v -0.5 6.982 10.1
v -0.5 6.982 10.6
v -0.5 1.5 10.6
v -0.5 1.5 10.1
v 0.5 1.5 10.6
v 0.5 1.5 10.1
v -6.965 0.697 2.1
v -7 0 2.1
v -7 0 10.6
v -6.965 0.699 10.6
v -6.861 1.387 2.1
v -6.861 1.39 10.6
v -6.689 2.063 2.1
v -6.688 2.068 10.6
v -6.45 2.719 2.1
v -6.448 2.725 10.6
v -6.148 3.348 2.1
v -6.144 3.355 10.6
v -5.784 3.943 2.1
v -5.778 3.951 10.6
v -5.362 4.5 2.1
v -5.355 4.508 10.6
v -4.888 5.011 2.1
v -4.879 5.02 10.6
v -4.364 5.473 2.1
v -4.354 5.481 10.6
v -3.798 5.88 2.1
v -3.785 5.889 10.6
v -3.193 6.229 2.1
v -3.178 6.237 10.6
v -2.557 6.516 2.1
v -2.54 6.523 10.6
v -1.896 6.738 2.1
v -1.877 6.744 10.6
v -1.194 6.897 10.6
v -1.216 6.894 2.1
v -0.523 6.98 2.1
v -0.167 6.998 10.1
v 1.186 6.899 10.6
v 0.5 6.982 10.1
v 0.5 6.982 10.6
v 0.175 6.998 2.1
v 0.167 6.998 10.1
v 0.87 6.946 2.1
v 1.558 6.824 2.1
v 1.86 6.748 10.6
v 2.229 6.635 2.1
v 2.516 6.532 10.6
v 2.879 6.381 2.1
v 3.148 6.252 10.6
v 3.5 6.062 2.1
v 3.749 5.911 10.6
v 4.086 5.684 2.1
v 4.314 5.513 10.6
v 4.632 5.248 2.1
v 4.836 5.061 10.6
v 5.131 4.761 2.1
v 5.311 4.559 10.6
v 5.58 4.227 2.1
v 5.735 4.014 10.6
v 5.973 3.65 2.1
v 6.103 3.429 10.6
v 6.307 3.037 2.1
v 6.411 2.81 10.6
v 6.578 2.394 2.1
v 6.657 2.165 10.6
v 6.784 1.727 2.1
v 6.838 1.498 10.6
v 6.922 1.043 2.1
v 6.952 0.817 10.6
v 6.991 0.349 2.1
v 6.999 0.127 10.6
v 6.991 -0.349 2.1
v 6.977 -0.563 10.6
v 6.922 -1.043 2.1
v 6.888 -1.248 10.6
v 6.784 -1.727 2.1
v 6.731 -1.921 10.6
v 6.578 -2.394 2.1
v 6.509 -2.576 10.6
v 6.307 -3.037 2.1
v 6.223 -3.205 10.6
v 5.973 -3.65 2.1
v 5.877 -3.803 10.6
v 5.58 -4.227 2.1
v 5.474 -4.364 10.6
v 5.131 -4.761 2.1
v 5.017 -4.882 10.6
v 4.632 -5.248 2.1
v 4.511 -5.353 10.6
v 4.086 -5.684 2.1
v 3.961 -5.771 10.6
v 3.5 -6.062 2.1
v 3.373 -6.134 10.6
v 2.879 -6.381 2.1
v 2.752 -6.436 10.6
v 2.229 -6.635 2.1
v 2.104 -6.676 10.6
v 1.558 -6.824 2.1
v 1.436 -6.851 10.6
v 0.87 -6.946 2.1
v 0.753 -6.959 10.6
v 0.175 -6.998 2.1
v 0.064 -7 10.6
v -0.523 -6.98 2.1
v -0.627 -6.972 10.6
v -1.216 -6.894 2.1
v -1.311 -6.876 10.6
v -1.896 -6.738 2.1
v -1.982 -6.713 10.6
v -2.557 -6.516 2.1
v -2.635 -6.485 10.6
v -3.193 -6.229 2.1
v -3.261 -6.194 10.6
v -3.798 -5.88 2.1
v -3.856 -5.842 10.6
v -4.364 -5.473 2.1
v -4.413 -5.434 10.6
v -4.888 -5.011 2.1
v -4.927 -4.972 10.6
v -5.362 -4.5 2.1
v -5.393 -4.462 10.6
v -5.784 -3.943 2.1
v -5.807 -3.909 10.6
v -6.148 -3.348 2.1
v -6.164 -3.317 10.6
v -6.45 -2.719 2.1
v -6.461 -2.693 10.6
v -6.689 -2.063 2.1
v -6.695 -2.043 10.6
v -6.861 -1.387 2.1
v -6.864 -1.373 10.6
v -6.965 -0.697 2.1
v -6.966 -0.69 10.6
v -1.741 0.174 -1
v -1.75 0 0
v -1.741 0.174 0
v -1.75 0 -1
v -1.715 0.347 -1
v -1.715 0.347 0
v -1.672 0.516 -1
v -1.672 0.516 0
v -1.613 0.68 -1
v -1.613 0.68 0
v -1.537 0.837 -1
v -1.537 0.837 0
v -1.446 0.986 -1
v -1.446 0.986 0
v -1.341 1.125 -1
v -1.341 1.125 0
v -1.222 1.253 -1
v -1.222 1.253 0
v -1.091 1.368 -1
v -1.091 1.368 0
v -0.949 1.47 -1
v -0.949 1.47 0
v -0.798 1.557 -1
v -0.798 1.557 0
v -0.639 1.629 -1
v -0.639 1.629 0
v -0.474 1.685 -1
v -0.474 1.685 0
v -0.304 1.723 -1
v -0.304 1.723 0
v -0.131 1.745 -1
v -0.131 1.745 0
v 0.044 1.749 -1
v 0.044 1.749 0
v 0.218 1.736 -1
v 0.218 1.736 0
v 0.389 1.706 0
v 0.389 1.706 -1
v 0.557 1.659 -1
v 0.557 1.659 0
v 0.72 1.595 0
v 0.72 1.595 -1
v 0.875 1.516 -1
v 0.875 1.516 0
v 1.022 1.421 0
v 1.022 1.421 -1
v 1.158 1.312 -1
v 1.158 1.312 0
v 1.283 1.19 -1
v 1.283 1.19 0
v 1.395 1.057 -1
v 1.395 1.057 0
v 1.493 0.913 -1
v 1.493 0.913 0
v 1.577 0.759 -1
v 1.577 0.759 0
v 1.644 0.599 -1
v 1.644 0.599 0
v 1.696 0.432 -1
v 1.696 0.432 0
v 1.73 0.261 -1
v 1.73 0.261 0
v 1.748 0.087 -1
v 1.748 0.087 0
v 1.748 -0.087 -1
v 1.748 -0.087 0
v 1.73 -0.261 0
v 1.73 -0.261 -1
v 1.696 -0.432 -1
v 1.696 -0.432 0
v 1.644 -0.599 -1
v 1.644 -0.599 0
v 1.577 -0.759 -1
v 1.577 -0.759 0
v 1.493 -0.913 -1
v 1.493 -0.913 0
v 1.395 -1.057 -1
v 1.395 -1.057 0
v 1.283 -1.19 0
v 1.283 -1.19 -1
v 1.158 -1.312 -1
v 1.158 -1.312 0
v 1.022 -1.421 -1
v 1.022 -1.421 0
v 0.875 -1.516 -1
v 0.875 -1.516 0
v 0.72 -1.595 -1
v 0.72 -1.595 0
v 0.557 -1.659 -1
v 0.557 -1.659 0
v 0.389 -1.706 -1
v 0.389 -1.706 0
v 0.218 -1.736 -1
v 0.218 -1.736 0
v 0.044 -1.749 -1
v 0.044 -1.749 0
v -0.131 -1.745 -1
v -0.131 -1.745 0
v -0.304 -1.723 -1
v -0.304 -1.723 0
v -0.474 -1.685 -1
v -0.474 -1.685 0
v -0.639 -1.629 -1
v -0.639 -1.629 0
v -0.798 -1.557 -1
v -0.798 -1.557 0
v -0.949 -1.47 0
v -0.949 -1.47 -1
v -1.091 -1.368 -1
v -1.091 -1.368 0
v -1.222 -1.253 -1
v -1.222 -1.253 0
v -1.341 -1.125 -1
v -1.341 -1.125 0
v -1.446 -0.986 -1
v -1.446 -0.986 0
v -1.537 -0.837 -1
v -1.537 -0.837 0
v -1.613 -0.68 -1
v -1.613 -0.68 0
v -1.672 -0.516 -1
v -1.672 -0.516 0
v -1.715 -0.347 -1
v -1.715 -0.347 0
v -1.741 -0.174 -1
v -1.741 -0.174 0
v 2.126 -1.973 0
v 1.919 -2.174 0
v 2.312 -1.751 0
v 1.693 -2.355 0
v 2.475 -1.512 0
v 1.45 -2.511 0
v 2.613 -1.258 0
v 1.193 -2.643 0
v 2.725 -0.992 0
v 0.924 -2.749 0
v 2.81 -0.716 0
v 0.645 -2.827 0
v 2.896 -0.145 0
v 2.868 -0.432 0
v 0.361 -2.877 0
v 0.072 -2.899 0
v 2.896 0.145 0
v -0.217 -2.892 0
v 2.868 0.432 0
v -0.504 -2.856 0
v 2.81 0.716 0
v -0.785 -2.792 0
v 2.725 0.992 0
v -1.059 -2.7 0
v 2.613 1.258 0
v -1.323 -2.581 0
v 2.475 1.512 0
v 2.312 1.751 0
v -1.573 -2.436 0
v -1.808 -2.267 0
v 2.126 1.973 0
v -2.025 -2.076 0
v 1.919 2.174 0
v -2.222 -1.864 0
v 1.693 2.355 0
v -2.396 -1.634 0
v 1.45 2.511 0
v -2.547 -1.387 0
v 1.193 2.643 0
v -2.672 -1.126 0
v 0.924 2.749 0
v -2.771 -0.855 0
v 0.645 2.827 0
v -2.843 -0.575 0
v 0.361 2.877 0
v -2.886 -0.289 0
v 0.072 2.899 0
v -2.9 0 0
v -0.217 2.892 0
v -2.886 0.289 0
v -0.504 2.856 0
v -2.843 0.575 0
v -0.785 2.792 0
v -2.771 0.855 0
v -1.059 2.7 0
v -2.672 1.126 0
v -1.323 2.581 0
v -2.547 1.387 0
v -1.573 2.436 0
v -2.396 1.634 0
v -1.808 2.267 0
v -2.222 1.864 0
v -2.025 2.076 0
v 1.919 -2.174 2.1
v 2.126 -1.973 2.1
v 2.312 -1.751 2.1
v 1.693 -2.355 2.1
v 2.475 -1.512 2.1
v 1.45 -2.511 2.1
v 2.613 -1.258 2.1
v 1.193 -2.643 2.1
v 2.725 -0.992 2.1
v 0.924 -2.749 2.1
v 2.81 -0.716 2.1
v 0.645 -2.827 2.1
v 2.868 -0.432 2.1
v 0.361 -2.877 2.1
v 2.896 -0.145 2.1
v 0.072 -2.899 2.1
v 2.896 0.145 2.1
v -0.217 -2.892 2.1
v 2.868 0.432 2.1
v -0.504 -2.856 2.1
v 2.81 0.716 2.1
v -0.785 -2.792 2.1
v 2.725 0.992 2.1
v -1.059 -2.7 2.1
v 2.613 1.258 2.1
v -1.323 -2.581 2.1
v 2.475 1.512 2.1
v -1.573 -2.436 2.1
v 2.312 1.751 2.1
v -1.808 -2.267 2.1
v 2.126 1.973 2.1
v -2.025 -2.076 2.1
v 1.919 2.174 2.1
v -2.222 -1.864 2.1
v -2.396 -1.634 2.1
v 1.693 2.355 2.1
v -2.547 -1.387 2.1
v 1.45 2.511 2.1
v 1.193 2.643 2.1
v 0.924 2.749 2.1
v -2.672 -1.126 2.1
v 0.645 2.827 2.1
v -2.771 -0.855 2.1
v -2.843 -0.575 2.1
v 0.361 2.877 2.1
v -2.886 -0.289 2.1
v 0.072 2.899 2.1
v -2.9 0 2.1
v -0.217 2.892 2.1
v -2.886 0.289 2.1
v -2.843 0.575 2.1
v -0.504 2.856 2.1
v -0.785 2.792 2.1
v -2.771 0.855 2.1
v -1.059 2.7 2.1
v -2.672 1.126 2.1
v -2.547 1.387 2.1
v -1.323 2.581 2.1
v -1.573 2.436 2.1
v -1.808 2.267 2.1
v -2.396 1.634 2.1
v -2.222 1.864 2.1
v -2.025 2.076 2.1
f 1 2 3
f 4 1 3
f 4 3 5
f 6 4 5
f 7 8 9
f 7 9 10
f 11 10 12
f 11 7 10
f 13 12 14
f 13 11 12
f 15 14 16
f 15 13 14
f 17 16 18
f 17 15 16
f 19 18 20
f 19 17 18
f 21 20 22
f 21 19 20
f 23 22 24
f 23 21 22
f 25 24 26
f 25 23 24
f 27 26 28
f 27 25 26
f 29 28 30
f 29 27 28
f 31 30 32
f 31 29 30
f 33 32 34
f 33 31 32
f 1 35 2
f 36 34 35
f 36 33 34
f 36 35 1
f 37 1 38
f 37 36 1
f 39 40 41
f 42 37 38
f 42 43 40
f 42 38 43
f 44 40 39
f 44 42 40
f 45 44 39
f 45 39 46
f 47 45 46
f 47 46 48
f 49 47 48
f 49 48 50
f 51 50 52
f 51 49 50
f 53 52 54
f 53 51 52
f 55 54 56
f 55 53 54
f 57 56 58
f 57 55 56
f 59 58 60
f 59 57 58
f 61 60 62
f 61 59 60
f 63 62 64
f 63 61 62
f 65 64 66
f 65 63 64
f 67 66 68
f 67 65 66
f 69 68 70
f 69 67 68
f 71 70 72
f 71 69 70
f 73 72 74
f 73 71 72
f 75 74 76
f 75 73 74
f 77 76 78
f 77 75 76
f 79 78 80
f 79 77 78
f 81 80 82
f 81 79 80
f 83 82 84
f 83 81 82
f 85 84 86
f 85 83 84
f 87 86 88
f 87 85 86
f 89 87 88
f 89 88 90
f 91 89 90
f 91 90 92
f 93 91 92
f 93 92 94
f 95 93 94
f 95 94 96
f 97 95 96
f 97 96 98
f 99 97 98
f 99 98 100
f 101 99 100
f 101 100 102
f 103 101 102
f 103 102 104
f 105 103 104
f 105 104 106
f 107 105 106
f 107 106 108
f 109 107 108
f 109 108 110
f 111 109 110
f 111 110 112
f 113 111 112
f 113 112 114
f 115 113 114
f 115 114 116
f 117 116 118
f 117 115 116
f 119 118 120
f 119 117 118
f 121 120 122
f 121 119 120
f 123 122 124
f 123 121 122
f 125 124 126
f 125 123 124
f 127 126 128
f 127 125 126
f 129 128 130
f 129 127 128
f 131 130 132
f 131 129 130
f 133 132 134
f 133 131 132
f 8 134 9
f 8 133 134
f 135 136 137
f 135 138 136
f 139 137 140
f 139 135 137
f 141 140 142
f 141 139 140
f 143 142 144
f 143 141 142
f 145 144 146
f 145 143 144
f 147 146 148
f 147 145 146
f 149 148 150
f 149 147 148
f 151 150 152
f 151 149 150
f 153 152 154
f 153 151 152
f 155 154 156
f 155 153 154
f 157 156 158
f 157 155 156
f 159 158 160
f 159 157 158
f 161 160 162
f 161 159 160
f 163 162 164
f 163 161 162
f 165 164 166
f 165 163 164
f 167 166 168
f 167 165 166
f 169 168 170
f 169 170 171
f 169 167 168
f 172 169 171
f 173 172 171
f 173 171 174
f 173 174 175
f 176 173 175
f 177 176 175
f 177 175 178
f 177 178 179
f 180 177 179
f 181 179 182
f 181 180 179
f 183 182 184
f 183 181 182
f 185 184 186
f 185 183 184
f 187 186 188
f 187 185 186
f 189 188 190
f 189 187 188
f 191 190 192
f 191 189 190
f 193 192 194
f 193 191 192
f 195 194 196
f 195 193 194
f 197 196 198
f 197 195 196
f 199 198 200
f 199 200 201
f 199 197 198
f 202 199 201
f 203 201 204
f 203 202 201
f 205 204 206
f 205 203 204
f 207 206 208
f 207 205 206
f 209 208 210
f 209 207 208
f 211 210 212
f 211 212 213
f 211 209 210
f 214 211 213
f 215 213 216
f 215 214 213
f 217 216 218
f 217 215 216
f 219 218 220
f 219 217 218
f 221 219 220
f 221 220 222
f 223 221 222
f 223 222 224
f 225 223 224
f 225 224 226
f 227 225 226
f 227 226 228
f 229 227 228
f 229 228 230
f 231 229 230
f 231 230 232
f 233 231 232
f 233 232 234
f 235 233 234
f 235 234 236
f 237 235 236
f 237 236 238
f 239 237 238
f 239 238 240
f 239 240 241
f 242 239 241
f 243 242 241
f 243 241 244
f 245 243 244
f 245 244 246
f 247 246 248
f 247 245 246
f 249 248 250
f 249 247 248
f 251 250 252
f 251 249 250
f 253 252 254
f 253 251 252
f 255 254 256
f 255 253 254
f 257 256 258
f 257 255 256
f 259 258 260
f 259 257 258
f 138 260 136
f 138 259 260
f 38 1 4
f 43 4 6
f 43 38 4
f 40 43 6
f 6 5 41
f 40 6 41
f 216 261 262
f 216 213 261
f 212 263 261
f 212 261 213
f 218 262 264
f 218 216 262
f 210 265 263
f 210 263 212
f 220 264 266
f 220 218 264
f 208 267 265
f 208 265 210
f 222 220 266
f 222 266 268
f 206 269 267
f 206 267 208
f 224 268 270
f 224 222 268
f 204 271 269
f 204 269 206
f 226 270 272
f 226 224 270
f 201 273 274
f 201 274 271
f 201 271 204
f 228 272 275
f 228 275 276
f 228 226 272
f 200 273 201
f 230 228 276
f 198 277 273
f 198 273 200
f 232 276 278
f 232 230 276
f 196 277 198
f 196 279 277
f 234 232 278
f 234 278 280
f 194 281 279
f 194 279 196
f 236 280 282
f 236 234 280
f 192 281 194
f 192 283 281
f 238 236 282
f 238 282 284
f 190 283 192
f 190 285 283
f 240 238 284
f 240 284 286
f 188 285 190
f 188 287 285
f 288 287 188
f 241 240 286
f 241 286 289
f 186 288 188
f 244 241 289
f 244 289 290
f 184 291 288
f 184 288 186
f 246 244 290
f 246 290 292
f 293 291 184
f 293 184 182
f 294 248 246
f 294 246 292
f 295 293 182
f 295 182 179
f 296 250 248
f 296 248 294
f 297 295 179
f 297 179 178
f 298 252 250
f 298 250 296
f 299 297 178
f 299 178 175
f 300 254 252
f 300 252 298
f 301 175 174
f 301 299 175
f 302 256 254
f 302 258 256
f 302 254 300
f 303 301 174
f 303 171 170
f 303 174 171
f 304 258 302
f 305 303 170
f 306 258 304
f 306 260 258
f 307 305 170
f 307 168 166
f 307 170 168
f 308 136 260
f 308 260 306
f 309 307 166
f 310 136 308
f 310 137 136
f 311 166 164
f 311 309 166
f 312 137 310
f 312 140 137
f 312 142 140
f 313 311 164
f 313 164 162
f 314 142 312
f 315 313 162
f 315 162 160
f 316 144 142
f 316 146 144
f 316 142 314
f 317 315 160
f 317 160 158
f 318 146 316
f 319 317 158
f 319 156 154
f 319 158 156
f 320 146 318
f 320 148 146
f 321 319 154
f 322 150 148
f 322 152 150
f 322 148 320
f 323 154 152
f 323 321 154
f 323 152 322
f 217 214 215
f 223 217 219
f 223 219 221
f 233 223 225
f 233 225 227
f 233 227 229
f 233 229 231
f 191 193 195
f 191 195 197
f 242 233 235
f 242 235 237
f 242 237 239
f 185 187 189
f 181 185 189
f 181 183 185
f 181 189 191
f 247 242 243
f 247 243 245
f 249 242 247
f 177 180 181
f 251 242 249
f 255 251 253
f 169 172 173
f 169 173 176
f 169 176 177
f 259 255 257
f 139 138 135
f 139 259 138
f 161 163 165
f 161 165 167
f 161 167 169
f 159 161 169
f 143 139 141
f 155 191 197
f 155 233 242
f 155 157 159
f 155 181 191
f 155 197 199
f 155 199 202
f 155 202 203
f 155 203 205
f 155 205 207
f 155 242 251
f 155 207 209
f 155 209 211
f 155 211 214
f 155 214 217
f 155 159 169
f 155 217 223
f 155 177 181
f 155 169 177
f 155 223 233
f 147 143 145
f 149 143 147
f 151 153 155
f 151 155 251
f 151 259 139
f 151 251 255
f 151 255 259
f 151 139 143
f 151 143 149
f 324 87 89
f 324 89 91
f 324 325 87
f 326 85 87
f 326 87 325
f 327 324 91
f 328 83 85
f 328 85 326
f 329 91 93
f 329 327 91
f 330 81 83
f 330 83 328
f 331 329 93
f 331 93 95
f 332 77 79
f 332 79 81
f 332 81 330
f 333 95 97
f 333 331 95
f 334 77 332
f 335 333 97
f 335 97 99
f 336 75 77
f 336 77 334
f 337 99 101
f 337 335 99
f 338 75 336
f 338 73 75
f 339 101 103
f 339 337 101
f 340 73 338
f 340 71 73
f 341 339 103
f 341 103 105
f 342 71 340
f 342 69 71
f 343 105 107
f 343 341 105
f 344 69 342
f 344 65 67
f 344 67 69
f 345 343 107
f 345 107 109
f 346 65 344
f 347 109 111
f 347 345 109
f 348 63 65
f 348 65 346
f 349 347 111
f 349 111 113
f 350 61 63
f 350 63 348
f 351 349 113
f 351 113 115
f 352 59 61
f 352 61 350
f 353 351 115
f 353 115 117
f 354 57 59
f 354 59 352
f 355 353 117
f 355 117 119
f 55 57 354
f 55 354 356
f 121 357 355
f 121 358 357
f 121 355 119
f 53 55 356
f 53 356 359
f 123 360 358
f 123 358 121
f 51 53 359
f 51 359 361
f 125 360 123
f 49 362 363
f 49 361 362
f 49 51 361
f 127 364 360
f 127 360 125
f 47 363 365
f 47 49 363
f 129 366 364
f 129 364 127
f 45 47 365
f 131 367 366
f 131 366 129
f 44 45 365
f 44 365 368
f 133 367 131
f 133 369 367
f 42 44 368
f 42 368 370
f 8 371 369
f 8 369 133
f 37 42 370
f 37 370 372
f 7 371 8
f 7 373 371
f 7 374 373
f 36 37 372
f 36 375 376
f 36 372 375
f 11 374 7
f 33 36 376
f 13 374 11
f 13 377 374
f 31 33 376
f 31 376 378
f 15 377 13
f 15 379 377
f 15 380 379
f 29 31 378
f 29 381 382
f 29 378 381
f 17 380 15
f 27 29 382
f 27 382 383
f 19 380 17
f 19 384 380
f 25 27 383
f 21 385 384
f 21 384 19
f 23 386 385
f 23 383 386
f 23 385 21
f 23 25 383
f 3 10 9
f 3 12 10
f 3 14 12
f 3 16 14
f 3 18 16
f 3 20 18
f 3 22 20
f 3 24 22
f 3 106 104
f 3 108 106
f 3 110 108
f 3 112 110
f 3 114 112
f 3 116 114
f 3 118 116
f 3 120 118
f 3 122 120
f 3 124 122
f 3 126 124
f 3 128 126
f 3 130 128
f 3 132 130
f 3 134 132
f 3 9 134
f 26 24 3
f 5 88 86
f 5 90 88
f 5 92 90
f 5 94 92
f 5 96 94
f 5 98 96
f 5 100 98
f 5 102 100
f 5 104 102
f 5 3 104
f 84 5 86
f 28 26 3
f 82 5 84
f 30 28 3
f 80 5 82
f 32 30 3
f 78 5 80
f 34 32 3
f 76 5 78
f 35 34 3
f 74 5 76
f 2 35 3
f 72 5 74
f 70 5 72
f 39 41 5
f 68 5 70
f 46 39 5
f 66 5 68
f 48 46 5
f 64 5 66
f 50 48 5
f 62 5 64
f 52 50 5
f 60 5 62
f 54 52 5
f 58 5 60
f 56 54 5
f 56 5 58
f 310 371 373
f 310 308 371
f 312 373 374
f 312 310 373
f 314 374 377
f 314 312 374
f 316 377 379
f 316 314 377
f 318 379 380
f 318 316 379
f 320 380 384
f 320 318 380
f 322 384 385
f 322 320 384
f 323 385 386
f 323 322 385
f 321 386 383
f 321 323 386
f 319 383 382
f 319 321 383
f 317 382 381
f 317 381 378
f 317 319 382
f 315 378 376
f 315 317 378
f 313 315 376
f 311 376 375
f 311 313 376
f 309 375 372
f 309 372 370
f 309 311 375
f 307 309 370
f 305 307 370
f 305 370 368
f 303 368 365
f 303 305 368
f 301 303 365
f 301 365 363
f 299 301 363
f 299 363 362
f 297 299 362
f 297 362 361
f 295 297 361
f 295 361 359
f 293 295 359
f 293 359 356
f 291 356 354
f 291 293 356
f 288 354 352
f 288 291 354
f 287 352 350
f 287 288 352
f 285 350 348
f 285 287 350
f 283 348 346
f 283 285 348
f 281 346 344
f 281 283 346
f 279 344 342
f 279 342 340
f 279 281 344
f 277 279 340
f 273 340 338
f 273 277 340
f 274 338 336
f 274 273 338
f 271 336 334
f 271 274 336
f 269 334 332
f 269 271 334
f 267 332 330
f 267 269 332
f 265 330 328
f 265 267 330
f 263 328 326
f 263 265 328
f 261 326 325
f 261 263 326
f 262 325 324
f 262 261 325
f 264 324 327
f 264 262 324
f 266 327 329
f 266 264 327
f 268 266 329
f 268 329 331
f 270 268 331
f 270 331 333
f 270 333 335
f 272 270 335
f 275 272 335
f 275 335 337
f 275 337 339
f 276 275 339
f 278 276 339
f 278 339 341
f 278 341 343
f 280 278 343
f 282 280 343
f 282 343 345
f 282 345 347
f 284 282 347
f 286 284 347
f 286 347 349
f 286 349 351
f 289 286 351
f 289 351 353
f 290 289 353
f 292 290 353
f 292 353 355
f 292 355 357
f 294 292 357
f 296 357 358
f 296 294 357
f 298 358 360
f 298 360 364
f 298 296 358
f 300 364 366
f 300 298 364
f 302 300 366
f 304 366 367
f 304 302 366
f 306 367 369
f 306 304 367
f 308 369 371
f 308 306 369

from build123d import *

# Parameters (mm, degrees)
F3_DEPTH = 0.5


with BuildPart() as f1:
    # F0 (on Front) → F1 (revolve)
    with BuildSketch(Plane.XZ):
        Polygon((-1.75, -1), (0, -1), (0, 10.6), (-7, 10.6), (-7, 2.1), (-2.9, 2.1), (-2.9, 0), (-1.75, 0), align=None)
    revolve(axis=Axis((0, 0, 4.8), (0, 0, -1)))

    # F2 (on face) → F3 (cut)
    with BuildSketch(Plane.XY.offset(10.6)):
        with BuildLine():
            Line((-0.5, 1.5), (0.5, 1.5))
            Line((0.5, 1.5), (0.5, 6.98212))
            ThreePointArc((0.5, 6.98212), (0, 7), (-0.5, 6.98212))
            Line((-0.5, 6.98212), (-0.5, 1.5))
        make_face()
    extrude(amount=-F3_DEPTH, mode=Mode.SUBTRACT)


solid = f1.part
